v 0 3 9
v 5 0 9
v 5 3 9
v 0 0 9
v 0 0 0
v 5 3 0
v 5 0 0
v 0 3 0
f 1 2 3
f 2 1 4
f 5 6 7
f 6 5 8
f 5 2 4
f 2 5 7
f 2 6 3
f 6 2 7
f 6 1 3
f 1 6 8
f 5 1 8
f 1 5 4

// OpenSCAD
// Generated by SolidPython 1.0.1 on 2020-07-29 00:46:54


cube(size = [5, 3, 9]);
/***********************************************
*********      SolidPython code:      **********
************************************************
 
# import packages: SolidPython
from solid import *
from solid.utils import *
from itertools import chain, combinations, permutations


class Resize:

    def __init__(self, scad_file):
        self.scad_file = scad_file
        #self.scad_file = import_scad(scad_file)
        # cone/cylinder param:
        self.r1 = 0
        self.r2 = 0
        self.h = 0
        # rectangular prism param:
        self.w = 0
        self.l = 0
        # ellipse param:
        self.r = 0

    # import OpenScad code (file name corresponds to shape)


    # classify shape + parameters
    def assign(self, param1, param2, param3):
        if self.scad_file == 'cone.scad':
            self.r1 = param1
            self.r2 = param2
            self.h = param3
        elif self.scad_file == 'cylinder.scad':
            self.r1 = param1
            self.r2 = param2
            self.h = param3
        elif self.scad_file == 'rectangularPrism.scad':
            self.h = param1
            self.l = param2
            self.w = param3
        else:
            self.r = param1
            self.h = param2

    # resize parameters
    def iterate(self):
        x = range(3, 20, 2)
        i = 1
        if self.scad_file == 'cone.scad':
            tempList = list(permutations(x, 2))
            for temp in tempList:
                param1 = temp[0]
                param2 = temp[1]
                filepath = 'produced_scad_files/' + 'cone' + str(param1) + '_' + str(param2) + '_' + '.scad'
                scad_render_to_file(cylinder(h=param1, r1=param2, r2=0), filepath)

        elif self.scad_file == 'cylinder.scad':
            tempList = list(permutations(x, 3))
            for temp in tempList:
                param1 = temp[0]
                param2 = temp[1]
                filepath = 'produced_scad_files/' + 'cylinder' + str(param1) + '_' + str(param2) + '_' + '.scad'
                scad_render_to_file(cylinder(h=param1, r1=param2, r2=param2), filepath)

        elif self.scad_file == 'rectangularPrism.scad':
            tempList = list(permutations(x, 3))
            for temp in tempList:
                param1 = temp[0]
                param2 = temp[1]
                param3 = temp[2]
                filepath = 'produced_scad_files/' + 'rectangularPrism' + str(param1) + '_' + str(param2) + '_' + str(
                    param3) + '.scad'
                scad_render_to_file(cube(size=(param1, param2, param3)), filepath)

        elif self.scad_file == 'ellipse.scad':
            tempList = list(permutations(x, 4))
            for temp in tempList:
                param1 = temp[0]
                param2 = temp[1]
                param3 = temp[2]
                param4 = temp[3]
                filepath = 'produced_scad_files/' + 'ellipse' + str(param1) + '_' + str(param2) + '_' + str(param3) + '_' + str(param4) + '.scad'
                scad_render_to_file(scale([param1, param2, param3])(sphere(r=param4)), filepath)

    def render_to_scadfile(self):
        scad_render_to_file(scad, 'example.scad') 
 
************************************************/
